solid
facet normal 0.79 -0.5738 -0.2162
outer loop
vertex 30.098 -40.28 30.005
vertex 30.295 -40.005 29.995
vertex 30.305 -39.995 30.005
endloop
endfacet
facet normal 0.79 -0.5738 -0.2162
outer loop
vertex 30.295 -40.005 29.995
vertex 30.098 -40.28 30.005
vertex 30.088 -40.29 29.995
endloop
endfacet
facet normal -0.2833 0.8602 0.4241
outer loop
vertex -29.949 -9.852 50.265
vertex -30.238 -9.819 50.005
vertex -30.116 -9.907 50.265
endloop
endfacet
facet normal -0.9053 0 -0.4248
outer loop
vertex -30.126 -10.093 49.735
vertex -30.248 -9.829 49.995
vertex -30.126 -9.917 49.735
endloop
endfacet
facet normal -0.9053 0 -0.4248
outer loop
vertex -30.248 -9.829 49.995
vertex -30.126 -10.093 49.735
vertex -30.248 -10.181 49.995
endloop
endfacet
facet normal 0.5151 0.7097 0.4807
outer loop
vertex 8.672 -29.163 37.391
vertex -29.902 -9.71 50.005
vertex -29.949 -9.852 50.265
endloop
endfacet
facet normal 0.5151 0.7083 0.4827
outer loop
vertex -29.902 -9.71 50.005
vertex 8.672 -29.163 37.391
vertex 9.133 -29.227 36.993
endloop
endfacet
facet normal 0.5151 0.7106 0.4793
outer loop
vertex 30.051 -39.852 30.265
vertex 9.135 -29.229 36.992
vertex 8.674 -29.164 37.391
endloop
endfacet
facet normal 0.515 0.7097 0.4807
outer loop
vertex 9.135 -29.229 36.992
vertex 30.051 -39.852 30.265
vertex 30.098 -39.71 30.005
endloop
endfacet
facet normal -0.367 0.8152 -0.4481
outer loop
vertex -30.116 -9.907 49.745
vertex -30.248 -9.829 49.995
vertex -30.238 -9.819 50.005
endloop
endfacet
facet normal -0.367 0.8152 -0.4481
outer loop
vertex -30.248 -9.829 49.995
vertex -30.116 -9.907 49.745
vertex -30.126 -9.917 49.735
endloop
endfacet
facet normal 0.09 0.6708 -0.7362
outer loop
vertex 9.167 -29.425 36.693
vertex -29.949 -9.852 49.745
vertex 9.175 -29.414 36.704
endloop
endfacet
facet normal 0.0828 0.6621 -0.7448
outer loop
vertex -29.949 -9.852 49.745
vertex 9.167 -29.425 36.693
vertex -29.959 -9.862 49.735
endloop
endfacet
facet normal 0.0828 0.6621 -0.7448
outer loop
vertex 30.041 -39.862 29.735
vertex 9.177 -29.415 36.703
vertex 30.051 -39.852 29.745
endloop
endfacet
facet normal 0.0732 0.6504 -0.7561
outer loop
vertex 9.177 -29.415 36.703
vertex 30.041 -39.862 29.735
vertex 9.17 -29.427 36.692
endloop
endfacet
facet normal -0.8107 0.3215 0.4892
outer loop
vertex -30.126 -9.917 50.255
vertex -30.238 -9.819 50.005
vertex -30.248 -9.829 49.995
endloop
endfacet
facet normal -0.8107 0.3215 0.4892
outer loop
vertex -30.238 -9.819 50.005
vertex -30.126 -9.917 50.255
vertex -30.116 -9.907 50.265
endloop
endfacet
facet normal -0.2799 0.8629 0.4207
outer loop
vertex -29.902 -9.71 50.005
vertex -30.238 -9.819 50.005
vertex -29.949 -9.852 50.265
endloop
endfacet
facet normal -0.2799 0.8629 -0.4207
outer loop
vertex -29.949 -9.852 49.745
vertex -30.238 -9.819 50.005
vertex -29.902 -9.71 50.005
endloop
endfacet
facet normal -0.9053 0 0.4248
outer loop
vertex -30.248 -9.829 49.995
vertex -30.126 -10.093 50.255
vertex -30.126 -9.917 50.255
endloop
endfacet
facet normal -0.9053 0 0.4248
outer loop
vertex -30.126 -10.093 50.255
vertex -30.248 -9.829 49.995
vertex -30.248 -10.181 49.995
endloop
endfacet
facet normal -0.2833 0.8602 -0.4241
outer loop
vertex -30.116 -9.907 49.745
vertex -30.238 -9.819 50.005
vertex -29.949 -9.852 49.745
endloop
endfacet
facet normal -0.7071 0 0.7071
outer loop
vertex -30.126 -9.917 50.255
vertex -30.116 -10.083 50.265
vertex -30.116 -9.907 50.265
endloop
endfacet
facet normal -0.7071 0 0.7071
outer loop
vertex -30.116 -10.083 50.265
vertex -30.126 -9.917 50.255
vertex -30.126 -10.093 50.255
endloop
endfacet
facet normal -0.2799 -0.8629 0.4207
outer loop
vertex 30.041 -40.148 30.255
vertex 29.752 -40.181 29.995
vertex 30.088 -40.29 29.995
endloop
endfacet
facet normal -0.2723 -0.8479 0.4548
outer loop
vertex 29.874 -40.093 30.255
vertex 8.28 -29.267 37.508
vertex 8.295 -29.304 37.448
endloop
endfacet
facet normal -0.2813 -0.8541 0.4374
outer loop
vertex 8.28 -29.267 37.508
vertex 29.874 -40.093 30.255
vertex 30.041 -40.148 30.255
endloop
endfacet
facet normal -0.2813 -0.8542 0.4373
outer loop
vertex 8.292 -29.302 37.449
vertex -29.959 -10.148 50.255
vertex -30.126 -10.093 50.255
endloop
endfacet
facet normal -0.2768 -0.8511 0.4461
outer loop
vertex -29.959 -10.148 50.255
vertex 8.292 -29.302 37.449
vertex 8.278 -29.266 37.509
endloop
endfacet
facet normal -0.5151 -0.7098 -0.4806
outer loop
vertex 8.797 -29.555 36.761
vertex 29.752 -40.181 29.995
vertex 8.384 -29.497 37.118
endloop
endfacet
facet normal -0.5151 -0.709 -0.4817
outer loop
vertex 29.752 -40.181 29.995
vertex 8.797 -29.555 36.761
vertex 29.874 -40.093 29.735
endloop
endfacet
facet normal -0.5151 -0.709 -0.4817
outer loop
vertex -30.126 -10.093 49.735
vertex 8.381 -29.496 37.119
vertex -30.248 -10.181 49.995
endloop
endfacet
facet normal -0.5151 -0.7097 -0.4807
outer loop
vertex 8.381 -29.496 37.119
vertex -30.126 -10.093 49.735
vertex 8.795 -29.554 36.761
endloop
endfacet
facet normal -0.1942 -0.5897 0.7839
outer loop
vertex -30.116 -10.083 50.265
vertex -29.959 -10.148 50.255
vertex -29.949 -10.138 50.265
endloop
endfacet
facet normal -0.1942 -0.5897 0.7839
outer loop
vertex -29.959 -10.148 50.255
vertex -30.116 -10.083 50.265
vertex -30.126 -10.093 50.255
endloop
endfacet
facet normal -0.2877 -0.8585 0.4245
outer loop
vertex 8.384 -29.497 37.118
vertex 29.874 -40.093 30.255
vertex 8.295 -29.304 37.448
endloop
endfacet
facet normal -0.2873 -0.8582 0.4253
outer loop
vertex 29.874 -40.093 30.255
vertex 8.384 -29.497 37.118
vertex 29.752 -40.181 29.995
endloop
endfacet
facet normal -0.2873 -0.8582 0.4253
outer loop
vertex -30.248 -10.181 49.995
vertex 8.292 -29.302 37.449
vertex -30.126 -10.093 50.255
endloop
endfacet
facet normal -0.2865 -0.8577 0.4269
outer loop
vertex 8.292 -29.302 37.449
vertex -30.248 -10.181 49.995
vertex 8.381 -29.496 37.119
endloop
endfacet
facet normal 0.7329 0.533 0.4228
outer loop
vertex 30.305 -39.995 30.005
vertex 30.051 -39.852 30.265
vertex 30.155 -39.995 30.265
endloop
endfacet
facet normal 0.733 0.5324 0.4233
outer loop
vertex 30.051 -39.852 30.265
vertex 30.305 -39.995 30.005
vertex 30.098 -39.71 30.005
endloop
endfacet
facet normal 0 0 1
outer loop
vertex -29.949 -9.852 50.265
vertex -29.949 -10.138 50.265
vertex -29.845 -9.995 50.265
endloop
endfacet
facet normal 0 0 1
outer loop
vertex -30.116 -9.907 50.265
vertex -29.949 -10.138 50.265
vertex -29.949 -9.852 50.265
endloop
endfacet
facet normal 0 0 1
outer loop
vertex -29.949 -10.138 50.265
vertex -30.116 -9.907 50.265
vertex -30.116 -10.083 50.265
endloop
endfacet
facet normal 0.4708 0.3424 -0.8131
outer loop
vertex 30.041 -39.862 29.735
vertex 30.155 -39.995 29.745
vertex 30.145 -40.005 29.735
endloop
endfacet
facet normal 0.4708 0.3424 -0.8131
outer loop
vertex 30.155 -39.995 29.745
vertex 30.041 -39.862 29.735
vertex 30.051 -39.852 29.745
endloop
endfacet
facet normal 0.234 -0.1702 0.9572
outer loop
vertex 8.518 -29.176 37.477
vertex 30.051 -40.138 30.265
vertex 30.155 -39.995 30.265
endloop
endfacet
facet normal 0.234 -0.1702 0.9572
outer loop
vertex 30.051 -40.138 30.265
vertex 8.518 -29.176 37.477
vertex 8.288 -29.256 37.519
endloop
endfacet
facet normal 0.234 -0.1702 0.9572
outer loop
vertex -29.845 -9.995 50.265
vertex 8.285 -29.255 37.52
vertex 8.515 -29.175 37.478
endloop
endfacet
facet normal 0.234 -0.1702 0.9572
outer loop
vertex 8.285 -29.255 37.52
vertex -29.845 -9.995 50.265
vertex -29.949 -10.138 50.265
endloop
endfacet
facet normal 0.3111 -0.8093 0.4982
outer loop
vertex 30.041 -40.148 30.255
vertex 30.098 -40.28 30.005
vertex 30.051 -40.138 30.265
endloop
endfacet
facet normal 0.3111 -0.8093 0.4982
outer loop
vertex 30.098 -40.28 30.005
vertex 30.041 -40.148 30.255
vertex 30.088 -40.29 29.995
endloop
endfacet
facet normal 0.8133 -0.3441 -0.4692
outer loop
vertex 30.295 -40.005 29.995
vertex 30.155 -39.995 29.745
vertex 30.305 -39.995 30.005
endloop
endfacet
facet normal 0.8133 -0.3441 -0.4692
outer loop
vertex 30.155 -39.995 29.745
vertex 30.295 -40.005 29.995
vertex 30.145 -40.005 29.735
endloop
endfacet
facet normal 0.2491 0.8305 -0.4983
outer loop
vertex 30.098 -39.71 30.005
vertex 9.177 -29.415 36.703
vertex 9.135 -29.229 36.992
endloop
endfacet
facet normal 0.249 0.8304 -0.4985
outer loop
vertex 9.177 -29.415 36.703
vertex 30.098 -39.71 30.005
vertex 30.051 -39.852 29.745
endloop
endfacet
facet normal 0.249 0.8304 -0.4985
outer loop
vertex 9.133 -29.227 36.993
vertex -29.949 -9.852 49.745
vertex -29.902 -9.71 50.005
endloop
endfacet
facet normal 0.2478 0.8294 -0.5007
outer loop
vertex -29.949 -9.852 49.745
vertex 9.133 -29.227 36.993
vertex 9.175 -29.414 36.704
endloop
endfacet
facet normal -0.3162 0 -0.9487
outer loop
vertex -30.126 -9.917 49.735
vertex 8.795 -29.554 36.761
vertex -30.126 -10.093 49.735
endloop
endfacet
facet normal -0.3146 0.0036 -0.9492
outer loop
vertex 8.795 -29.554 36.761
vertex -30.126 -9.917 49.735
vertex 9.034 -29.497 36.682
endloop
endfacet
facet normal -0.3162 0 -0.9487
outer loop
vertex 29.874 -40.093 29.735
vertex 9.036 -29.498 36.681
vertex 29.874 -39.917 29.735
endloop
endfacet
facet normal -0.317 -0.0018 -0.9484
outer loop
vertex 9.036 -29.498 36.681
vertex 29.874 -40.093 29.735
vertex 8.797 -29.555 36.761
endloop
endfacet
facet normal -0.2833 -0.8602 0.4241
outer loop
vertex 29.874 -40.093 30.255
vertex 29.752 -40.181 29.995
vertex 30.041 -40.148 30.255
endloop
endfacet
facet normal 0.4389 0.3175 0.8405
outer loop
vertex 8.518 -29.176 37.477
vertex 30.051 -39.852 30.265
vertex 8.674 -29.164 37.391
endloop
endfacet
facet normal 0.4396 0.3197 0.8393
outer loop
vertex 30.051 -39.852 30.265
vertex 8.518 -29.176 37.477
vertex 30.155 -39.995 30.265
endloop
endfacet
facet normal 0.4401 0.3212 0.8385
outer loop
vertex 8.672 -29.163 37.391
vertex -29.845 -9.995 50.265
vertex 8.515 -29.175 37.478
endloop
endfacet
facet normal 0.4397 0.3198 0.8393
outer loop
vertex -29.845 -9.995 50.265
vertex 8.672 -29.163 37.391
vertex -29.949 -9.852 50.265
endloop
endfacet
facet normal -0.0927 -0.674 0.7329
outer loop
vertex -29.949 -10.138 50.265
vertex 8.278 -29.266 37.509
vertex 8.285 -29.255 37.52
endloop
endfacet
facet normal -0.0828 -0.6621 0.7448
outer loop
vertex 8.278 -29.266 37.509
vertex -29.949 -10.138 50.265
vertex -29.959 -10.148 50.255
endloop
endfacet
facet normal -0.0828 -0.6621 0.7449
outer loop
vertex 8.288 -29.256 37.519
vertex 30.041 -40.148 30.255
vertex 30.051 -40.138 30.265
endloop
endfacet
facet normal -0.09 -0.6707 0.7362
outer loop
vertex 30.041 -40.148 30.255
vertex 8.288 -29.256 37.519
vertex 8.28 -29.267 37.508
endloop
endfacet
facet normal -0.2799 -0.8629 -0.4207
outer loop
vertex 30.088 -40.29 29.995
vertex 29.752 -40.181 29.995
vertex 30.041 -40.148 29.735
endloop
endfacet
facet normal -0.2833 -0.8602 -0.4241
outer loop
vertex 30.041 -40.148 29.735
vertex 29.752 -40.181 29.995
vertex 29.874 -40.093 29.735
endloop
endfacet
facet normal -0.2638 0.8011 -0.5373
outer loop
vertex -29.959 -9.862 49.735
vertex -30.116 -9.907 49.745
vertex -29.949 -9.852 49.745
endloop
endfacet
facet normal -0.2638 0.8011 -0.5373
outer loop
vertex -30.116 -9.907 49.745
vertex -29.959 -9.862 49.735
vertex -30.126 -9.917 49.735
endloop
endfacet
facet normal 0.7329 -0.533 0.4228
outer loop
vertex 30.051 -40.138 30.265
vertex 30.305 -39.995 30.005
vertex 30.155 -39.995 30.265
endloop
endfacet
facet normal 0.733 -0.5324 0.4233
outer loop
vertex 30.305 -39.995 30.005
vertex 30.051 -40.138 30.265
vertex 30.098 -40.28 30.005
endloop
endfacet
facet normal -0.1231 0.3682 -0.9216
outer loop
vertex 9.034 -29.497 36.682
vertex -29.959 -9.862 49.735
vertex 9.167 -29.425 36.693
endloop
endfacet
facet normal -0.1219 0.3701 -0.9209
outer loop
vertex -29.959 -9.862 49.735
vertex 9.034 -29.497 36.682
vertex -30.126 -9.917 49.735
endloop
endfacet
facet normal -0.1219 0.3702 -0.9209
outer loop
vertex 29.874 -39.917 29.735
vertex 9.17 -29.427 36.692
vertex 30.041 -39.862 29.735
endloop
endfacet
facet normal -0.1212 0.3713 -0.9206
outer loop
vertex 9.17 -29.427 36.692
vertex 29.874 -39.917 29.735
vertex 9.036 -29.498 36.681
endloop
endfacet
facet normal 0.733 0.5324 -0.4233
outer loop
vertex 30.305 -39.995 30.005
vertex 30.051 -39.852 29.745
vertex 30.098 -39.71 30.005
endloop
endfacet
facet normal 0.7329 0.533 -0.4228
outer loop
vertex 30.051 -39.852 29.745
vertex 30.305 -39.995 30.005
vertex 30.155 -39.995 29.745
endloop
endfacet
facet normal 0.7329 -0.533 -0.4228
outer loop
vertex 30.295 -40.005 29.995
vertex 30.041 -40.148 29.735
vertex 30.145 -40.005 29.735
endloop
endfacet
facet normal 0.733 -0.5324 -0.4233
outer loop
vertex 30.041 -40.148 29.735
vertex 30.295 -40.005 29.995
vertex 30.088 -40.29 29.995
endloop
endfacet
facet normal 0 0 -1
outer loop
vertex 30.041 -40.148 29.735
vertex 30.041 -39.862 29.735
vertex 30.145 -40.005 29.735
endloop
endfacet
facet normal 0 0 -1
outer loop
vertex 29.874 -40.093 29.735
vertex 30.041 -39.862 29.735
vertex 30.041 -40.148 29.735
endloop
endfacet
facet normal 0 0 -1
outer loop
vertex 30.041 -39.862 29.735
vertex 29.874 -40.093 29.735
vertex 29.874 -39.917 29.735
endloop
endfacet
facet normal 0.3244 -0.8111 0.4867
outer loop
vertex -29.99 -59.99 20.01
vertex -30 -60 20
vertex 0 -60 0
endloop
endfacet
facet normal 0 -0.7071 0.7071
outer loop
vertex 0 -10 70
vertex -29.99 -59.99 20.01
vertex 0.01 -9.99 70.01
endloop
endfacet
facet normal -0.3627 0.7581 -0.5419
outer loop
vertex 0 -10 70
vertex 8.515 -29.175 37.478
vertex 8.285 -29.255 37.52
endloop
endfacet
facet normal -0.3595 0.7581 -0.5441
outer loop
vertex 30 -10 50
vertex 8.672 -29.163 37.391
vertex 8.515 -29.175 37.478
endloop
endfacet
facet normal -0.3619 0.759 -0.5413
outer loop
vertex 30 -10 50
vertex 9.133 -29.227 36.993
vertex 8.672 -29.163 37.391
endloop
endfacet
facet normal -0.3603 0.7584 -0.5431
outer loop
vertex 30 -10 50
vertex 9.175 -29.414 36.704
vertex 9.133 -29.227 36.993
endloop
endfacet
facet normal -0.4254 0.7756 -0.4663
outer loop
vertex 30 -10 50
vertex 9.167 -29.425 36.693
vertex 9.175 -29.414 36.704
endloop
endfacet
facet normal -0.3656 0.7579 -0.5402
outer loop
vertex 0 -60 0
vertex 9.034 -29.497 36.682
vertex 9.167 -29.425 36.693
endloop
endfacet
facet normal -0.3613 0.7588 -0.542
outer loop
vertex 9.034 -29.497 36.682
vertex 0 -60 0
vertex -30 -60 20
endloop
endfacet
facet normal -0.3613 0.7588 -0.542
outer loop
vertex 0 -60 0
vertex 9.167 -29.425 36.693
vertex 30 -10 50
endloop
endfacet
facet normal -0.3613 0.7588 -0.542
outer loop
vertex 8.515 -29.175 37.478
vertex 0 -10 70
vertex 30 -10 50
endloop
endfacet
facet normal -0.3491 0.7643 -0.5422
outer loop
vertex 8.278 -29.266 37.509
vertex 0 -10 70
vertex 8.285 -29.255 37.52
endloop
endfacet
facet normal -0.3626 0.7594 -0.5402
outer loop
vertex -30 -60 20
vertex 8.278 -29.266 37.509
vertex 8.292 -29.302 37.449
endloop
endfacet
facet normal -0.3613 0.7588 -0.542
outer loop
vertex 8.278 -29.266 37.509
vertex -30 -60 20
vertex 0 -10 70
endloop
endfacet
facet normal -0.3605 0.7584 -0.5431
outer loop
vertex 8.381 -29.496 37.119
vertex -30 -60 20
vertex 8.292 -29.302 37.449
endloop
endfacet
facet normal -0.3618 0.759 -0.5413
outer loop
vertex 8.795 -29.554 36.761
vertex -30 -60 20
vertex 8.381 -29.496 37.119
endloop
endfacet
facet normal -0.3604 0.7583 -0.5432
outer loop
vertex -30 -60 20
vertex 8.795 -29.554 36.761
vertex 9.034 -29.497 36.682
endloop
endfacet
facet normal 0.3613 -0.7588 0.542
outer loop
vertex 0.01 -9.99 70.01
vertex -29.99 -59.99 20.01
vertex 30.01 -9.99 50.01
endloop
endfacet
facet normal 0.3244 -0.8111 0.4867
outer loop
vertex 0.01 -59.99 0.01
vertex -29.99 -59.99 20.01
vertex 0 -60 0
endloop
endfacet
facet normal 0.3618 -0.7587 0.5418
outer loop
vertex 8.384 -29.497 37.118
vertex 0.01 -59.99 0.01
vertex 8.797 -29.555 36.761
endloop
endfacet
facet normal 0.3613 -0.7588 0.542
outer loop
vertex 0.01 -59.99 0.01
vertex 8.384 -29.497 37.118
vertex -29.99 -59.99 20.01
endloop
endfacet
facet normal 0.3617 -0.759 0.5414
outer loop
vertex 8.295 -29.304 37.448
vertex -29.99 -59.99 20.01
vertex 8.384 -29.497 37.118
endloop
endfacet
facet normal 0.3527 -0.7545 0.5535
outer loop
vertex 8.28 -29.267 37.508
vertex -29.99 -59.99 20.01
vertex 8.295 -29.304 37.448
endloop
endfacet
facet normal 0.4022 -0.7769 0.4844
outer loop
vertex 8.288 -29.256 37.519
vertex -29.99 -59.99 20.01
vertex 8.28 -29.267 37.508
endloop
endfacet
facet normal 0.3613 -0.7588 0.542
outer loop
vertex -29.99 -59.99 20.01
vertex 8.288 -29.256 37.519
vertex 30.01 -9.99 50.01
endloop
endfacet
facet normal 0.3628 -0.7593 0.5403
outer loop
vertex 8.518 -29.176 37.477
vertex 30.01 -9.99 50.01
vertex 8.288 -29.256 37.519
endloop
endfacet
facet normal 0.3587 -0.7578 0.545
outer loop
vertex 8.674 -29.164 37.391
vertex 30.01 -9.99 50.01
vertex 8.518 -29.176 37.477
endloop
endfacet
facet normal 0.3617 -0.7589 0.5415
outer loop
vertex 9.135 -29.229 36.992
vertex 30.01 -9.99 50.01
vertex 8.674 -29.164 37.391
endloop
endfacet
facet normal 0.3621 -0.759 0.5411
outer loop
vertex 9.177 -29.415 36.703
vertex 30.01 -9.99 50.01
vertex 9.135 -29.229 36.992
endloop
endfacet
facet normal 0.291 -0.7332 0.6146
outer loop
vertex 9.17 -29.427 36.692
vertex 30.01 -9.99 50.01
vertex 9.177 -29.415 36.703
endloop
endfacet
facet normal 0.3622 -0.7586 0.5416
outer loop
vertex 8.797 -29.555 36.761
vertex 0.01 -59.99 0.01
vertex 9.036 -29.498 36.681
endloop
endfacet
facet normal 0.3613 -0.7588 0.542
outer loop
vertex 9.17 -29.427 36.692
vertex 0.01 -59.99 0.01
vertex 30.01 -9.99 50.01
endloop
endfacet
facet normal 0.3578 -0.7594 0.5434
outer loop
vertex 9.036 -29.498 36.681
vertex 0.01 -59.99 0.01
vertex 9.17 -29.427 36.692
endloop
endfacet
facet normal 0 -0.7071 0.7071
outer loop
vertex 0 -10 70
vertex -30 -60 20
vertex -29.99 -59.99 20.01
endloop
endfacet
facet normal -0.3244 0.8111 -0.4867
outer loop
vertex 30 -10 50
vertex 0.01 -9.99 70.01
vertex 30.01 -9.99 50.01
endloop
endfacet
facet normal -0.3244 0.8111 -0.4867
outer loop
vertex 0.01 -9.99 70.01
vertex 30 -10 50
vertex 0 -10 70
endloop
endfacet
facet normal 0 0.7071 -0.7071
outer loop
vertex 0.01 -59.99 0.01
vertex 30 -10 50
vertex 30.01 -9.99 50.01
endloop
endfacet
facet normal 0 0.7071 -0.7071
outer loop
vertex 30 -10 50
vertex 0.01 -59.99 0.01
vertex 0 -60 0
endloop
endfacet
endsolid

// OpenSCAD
// file: deskriptiva.scad
module unitTriangle() {
	linear_extrude(0.01)
	polygon([[0, 0], [u, 0], [0, u]]);
}

module unitParallelogram() {
	linear_extrude(0.01)
	polygon([[0, 0], [u, 0], [0, u], [-u, u]]);
}

module unitPyramid(n) {
	step = 360 / n;
		hull() {
		for (i = [0: n]) {
			translate([cos(i*step) * u, sin(i*step) * u, 0]) cube(0.01, center=true);
		}
		translate([0, 0, u]) cube(0.01, center=true);
	}
}

module unitLine() {
	translate([u/2, 0, 0]) cube([u, 0.01, 0.01], center=true);
}

module magnify(thickness) {
	minkowski() {
		children();
		sphere(thickness);
	}
}

module transform(A, B, C) {
	// all y coords are switched
    dA = [0, 0, 0];
    dB = [B.x - A.x, - B.y + A.y, B.z - A.z];
    dC = [C.x - A.x, - C.y + A.y, C.z - A.z];
    m = [
        [dB.x, dC.x, 1, u*A.x],
        [dB.y, dC.y, 1, -u*A.y],
        [dB.z, dC.z, 1, u*A.z],
        [0, 0, 0, 1]
    ];
    
    multmatrix(m) children();
} 

module oneAxisTransform(S, A, V) {
	// all y coords are switched
    dS = [0, 0, 0];
    dA = [A.x - S.x, - A.y + S.y, A.z - S.z];
    dV = [V.x - S.x, - V.y + S.y, V.z - S.z];
	dANormal = cross([0, 0, 1], dA);
    m = [
        [dA.x, dANormal.x, dV.x, u*S.x],
        [dA.y, dANormal.y,dV.y, -u*S.y],
        [dA.z, dANormal.z, dV.z, u*S.z],
        [0, 0, 0, 1]
    ];
    
    multmatrix(m) children();
}
// main file
u = 10;
include<deskriptiva.scad>

color("Lime") magnify(0.3)
transform([-3, 1, 5], [3, 4, 3], [-3, 1, 5])
unitLine();

color("Yellow")
transform([0, 1, 7], [-3, 6, 2], [0, 6, 0])
unitParallelogram();
